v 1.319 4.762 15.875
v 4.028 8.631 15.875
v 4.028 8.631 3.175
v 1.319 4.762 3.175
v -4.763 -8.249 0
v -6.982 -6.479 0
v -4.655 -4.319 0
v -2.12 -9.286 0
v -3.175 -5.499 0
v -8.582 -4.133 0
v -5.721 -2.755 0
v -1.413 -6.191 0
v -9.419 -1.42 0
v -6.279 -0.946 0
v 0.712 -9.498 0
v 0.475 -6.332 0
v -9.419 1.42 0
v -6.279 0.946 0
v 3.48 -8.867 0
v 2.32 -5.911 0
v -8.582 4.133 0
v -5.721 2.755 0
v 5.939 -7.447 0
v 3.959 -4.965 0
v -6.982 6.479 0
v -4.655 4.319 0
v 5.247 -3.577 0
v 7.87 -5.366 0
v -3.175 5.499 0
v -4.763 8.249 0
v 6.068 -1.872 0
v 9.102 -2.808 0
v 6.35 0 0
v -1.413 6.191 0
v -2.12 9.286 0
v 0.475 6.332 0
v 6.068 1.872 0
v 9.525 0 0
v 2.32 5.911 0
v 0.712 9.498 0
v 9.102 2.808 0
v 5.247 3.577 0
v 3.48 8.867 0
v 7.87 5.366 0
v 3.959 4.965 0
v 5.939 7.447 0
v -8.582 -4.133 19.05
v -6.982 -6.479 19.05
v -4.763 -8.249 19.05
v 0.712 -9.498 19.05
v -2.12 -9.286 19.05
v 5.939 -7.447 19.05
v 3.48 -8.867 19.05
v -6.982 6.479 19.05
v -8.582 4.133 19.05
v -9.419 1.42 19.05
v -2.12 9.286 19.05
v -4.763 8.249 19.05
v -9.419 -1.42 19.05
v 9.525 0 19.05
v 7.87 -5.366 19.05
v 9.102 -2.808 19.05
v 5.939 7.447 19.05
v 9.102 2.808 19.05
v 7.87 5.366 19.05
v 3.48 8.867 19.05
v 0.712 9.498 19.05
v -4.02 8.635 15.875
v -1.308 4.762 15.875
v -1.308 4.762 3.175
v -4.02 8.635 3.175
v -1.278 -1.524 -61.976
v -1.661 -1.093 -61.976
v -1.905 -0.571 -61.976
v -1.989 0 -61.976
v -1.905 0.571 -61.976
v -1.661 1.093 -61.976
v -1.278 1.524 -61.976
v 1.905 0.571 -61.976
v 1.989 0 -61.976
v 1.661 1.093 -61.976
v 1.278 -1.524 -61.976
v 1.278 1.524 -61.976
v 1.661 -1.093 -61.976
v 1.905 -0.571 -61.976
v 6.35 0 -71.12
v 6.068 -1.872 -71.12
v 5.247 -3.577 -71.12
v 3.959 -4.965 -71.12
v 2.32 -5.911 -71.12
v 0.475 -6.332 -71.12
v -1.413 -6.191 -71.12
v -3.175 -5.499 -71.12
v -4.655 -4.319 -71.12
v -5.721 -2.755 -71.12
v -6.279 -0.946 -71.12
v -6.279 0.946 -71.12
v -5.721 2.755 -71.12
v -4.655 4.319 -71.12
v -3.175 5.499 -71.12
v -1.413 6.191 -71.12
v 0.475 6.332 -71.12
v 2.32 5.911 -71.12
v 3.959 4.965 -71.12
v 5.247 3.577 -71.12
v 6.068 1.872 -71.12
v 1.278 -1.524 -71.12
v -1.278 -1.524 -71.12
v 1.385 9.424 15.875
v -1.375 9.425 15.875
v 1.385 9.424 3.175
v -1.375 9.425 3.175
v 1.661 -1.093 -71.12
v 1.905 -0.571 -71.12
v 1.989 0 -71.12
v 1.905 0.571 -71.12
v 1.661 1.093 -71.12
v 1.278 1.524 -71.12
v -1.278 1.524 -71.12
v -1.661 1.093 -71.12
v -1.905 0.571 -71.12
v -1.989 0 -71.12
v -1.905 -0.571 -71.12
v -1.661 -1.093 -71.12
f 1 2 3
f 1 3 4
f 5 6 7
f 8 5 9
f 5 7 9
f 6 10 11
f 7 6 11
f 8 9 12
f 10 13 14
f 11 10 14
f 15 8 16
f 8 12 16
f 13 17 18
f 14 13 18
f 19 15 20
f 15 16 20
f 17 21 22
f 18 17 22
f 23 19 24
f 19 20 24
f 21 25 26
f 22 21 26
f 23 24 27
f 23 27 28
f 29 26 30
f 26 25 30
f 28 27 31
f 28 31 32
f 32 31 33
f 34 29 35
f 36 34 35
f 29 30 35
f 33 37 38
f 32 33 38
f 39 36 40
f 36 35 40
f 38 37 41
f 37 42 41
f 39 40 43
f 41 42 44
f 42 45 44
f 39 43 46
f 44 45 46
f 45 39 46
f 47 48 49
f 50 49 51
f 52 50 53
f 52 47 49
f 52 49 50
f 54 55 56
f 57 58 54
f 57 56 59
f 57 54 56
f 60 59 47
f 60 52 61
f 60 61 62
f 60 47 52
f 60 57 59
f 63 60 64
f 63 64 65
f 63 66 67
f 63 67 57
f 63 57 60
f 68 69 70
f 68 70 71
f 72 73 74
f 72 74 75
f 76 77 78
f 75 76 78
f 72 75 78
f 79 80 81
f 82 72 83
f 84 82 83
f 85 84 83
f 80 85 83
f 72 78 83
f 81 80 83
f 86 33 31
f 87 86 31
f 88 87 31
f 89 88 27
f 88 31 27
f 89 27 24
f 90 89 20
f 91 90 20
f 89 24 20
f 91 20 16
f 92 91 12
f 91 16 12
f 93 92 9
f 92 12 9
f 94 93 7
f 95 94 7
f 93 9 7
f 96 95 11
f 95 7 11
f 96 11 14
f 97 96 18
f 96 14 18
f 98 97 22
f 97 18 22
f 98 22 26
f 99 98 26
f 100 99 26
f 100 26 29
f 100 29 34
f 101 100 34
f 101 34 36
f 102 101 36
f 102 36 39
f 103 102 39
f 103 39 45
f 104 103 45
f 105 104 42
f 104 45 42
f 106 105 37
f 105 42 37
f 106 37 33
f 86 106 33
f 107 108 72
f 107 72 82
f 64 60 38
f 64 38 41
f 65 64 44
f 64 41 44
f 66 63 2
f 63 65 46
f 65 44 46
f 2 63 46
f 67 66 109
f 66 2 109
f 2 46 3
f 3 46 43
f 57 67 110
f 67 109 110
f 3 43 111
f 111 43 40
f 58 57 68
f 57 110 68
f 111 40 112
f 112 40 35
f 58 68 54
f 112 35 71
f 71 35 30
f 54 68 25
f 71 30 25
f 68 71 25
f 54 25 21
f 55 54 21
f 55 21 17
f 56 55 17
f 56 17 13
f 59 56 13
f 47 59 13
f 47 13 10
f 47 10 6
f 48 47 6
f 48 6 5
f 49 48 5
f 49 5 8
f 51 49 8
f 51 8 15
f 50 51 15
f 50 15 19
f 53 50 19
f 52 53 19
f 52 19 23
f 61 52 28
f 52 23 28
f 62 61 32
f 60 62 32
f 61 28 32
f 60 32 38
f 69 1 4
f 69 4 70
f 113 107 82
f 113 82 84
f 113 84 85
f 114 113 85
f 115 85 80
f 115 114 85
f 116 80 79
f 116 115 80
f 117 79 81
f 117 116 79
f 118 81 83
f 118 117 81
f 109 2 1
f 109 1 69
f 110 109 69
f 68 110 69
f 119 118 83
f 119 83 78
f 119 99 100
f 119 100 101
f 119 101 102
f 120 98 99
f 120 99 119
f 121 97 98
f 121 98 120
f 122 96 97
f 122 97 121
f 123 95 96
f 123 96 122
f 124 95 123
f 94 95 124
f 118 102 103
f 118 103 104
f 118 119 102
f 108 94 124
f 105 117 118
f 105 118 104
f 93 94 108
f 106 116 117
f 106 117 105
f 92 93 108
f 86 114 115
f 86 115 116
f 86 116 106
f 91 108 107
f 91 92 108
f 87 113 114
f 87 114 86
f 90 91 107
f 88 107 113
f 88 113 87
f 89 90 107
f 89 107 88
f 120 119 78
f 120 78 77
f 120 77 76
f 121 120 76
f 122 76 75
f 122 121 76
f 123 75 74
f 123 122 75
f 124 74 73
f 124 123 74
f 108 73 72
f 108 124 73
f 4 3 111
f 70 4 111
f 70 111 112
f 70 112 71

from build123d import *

# Parameters (mm, degrees)
SKETCH1_R           = 9.525
BOSS_EXTRUDE1_DEPTH = 19.05
SKETCH2_R           = 6.35
BOSS_EXTRUDE2_DEPTH = 71.12
CUT_EXTRUDE1_DEPTH  = 9.144
CUT_EXTRUDE2_START  = -3.175
CUT_EXTRUDE2_DEPTH  = 12.7


with BuildPart() as part:
    # Sketch1 → Boss-Extrude1 (new body)
    with BuildSketch(Plane.XY):
        Circle(SKETCH1_R)
    extrude(amount=BOSS_EXTRUDE1_DEPTH)

    # Sketch2 → Boss-Extrude2 (add)
    with BuildSketch(Plane(origin=(0, 0, 0), x_dir=(-1, 0, 0), z_dir=(0, 0, -1))):
        with Locations(Location((0, 0, 0), (0, 0, 180))):  # turned: the seam where the file's is
            Circle(SKETCH2_R)
    extrude(amount=BOSS_EXTRUDE2_DEPTH)

    # Sketch3 → Cut-Extrude1 (cut)
    with BuildSketch(Plane(origin=(0, 0, -71.12), x_dir=(-1, 0, 0), z_dir=(0, 0, -1))):
        with BuildLine():
            Line((-1.277821972, 1.524), (1.277821972, 1.524))
            ThreePointArc((1.277821972, 1.524), (1.98882, 0), (1.277821972, -1.524))
            Line((1.277821972, -1.524), (-1.277821972, -1.524))
            ThreePointArc((-1.277821972, -1.524), (-1.98882, 0), (-1.277821972, 1.524))
        make_face()
    extrude(amount=-CUT_EXTRUDE1_DEPTH, mode=Mode.SUBTRACT)

    # Sketch4 → Cut-Extrude2 (cut)
    with BuildSketch(Plane.XY.offset(19.05).offset(CUT_EXTRUDE2_START)):
        with BuildLine():
            Line((0, 4.7625), (-1.308111225, 4.7625))
            Line((-1.308111225, 4.7625), (-4.019808446, 8.635204981))
            ThreePointArc((-4.019808446, 8.635204981), (0.004701224, 9.52499884), (4.028330588, 8.631232686))
            Line((4.028330588, 8.631232686), (1.319414798, 4.7625))
            Line((1.319414798, 4.7625), (0, 4.7625))
        make_face()
    extrude(amount=-CUT_EXTRUDE2_DEPTH, mode=Mode.SUBTRACT)


solid = part.part
